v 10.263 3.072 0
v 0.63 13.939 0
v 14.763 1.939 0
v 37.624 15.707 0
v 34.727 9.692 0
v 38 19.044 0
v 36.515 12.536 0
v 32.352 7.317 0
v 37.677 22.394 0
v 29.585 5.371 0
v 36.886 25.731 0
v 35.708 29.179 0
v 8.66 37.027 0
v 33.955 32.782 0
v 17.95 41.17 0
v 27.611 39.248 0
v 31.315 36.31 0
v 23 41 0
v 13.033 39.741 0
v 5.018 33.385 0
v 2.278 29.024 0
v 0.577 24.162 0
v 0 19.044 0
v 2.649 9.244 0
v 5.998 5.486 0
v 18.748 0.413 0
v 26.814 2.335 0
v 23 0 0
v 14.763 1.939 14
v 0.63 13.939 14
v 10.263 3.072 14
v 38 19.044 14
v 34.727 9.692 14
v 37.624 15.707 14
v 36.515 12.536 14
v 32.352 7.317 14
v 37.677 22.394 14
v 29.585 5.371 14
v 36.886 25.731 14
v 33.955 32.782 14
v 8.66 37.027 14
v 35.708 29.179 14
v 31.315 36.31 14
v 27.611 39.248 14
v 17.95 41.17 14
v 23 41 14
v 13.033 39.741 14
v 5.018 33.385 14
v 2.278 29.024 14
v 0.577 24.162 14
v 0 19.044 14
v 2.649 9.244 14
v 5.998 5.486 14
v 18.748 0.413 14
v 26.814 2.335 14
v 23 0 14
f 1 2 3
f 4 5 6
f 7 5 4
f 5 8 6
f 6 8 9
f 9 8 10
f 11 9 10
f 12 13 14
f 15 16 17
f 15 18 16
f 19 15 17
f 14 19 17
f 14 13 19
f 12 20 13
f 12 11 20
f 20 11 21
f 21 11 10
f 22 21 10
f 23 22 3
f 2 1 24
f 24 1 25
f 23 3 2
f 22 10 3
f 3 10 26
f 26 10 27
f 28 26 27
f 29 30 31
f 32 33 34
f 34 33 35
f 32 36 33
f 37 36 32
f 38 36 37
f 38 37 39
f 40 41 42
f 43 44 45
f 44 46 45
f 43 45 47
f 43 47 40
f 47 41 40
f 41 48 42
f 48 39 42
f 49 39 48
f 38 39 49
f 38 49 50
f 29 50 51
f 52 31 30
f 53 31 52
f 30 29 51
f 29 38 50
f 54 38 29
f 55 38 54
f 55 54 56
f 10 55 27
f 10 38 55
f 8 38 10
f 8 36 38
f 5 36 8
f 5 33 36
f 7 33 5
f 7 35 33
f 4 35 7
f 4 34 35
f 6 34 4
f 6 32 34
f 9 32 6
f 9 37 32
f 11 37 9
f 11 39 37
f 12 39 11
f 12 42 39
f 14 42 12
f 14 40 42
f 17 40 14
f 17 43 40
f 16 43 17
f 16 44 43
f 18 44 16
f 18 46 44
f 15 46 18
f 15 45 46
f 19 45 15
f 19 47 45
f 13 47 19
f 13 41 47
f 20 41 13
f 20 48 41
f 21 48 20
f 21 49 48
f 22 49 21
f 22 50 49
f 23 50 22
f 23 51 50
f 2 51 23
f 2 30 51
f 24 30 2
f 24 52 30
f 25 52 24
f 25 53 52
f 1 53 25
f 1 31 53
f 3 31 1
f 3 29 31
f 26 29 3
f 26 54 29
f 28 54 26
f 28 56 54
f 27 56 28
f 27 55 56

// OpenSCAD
$fn = 32;

// ----------------------------------------------------------------------
// Cam disc: base radius 15.0 mm, lift 8.0 mm, 28 profile points
// ----------------------------------------------------------------------

// --- parameters (mm) ---
profile_height = 14;      // extrusion height
profile_points = 28;      // points of the closed outline

profile = [[38, 19.044], [37.677, 22.394], [36.886, 25.731], [35.708, 29.179], [33.955, 32.782], [31.315, 36.31], [27.611, 39.248], [23, 41], [17.95, 41.17], [13.033, 39.741], [8.66, 37.027], [5.018, 33.385], [2.278, 29.024], [0.577, 24.162], [0, 19.044], [0.63, 13.939], [2.649, 9.244], [5.998, 5.486], [10.263, 3.072], [14.763, 1.939], [18.748, 0.413], [23, 0], [26.814, 2.335], [29.585, 5.371], [32.352, 7.317], [34.727, 9.692], [36.515, 12.536], [37.624, 15.707]];  // single closed polygon, 28 points, counter clockwise

// --- the one profile operation ---
linear_extrude(height = profile_height) polygon(points = profile);
